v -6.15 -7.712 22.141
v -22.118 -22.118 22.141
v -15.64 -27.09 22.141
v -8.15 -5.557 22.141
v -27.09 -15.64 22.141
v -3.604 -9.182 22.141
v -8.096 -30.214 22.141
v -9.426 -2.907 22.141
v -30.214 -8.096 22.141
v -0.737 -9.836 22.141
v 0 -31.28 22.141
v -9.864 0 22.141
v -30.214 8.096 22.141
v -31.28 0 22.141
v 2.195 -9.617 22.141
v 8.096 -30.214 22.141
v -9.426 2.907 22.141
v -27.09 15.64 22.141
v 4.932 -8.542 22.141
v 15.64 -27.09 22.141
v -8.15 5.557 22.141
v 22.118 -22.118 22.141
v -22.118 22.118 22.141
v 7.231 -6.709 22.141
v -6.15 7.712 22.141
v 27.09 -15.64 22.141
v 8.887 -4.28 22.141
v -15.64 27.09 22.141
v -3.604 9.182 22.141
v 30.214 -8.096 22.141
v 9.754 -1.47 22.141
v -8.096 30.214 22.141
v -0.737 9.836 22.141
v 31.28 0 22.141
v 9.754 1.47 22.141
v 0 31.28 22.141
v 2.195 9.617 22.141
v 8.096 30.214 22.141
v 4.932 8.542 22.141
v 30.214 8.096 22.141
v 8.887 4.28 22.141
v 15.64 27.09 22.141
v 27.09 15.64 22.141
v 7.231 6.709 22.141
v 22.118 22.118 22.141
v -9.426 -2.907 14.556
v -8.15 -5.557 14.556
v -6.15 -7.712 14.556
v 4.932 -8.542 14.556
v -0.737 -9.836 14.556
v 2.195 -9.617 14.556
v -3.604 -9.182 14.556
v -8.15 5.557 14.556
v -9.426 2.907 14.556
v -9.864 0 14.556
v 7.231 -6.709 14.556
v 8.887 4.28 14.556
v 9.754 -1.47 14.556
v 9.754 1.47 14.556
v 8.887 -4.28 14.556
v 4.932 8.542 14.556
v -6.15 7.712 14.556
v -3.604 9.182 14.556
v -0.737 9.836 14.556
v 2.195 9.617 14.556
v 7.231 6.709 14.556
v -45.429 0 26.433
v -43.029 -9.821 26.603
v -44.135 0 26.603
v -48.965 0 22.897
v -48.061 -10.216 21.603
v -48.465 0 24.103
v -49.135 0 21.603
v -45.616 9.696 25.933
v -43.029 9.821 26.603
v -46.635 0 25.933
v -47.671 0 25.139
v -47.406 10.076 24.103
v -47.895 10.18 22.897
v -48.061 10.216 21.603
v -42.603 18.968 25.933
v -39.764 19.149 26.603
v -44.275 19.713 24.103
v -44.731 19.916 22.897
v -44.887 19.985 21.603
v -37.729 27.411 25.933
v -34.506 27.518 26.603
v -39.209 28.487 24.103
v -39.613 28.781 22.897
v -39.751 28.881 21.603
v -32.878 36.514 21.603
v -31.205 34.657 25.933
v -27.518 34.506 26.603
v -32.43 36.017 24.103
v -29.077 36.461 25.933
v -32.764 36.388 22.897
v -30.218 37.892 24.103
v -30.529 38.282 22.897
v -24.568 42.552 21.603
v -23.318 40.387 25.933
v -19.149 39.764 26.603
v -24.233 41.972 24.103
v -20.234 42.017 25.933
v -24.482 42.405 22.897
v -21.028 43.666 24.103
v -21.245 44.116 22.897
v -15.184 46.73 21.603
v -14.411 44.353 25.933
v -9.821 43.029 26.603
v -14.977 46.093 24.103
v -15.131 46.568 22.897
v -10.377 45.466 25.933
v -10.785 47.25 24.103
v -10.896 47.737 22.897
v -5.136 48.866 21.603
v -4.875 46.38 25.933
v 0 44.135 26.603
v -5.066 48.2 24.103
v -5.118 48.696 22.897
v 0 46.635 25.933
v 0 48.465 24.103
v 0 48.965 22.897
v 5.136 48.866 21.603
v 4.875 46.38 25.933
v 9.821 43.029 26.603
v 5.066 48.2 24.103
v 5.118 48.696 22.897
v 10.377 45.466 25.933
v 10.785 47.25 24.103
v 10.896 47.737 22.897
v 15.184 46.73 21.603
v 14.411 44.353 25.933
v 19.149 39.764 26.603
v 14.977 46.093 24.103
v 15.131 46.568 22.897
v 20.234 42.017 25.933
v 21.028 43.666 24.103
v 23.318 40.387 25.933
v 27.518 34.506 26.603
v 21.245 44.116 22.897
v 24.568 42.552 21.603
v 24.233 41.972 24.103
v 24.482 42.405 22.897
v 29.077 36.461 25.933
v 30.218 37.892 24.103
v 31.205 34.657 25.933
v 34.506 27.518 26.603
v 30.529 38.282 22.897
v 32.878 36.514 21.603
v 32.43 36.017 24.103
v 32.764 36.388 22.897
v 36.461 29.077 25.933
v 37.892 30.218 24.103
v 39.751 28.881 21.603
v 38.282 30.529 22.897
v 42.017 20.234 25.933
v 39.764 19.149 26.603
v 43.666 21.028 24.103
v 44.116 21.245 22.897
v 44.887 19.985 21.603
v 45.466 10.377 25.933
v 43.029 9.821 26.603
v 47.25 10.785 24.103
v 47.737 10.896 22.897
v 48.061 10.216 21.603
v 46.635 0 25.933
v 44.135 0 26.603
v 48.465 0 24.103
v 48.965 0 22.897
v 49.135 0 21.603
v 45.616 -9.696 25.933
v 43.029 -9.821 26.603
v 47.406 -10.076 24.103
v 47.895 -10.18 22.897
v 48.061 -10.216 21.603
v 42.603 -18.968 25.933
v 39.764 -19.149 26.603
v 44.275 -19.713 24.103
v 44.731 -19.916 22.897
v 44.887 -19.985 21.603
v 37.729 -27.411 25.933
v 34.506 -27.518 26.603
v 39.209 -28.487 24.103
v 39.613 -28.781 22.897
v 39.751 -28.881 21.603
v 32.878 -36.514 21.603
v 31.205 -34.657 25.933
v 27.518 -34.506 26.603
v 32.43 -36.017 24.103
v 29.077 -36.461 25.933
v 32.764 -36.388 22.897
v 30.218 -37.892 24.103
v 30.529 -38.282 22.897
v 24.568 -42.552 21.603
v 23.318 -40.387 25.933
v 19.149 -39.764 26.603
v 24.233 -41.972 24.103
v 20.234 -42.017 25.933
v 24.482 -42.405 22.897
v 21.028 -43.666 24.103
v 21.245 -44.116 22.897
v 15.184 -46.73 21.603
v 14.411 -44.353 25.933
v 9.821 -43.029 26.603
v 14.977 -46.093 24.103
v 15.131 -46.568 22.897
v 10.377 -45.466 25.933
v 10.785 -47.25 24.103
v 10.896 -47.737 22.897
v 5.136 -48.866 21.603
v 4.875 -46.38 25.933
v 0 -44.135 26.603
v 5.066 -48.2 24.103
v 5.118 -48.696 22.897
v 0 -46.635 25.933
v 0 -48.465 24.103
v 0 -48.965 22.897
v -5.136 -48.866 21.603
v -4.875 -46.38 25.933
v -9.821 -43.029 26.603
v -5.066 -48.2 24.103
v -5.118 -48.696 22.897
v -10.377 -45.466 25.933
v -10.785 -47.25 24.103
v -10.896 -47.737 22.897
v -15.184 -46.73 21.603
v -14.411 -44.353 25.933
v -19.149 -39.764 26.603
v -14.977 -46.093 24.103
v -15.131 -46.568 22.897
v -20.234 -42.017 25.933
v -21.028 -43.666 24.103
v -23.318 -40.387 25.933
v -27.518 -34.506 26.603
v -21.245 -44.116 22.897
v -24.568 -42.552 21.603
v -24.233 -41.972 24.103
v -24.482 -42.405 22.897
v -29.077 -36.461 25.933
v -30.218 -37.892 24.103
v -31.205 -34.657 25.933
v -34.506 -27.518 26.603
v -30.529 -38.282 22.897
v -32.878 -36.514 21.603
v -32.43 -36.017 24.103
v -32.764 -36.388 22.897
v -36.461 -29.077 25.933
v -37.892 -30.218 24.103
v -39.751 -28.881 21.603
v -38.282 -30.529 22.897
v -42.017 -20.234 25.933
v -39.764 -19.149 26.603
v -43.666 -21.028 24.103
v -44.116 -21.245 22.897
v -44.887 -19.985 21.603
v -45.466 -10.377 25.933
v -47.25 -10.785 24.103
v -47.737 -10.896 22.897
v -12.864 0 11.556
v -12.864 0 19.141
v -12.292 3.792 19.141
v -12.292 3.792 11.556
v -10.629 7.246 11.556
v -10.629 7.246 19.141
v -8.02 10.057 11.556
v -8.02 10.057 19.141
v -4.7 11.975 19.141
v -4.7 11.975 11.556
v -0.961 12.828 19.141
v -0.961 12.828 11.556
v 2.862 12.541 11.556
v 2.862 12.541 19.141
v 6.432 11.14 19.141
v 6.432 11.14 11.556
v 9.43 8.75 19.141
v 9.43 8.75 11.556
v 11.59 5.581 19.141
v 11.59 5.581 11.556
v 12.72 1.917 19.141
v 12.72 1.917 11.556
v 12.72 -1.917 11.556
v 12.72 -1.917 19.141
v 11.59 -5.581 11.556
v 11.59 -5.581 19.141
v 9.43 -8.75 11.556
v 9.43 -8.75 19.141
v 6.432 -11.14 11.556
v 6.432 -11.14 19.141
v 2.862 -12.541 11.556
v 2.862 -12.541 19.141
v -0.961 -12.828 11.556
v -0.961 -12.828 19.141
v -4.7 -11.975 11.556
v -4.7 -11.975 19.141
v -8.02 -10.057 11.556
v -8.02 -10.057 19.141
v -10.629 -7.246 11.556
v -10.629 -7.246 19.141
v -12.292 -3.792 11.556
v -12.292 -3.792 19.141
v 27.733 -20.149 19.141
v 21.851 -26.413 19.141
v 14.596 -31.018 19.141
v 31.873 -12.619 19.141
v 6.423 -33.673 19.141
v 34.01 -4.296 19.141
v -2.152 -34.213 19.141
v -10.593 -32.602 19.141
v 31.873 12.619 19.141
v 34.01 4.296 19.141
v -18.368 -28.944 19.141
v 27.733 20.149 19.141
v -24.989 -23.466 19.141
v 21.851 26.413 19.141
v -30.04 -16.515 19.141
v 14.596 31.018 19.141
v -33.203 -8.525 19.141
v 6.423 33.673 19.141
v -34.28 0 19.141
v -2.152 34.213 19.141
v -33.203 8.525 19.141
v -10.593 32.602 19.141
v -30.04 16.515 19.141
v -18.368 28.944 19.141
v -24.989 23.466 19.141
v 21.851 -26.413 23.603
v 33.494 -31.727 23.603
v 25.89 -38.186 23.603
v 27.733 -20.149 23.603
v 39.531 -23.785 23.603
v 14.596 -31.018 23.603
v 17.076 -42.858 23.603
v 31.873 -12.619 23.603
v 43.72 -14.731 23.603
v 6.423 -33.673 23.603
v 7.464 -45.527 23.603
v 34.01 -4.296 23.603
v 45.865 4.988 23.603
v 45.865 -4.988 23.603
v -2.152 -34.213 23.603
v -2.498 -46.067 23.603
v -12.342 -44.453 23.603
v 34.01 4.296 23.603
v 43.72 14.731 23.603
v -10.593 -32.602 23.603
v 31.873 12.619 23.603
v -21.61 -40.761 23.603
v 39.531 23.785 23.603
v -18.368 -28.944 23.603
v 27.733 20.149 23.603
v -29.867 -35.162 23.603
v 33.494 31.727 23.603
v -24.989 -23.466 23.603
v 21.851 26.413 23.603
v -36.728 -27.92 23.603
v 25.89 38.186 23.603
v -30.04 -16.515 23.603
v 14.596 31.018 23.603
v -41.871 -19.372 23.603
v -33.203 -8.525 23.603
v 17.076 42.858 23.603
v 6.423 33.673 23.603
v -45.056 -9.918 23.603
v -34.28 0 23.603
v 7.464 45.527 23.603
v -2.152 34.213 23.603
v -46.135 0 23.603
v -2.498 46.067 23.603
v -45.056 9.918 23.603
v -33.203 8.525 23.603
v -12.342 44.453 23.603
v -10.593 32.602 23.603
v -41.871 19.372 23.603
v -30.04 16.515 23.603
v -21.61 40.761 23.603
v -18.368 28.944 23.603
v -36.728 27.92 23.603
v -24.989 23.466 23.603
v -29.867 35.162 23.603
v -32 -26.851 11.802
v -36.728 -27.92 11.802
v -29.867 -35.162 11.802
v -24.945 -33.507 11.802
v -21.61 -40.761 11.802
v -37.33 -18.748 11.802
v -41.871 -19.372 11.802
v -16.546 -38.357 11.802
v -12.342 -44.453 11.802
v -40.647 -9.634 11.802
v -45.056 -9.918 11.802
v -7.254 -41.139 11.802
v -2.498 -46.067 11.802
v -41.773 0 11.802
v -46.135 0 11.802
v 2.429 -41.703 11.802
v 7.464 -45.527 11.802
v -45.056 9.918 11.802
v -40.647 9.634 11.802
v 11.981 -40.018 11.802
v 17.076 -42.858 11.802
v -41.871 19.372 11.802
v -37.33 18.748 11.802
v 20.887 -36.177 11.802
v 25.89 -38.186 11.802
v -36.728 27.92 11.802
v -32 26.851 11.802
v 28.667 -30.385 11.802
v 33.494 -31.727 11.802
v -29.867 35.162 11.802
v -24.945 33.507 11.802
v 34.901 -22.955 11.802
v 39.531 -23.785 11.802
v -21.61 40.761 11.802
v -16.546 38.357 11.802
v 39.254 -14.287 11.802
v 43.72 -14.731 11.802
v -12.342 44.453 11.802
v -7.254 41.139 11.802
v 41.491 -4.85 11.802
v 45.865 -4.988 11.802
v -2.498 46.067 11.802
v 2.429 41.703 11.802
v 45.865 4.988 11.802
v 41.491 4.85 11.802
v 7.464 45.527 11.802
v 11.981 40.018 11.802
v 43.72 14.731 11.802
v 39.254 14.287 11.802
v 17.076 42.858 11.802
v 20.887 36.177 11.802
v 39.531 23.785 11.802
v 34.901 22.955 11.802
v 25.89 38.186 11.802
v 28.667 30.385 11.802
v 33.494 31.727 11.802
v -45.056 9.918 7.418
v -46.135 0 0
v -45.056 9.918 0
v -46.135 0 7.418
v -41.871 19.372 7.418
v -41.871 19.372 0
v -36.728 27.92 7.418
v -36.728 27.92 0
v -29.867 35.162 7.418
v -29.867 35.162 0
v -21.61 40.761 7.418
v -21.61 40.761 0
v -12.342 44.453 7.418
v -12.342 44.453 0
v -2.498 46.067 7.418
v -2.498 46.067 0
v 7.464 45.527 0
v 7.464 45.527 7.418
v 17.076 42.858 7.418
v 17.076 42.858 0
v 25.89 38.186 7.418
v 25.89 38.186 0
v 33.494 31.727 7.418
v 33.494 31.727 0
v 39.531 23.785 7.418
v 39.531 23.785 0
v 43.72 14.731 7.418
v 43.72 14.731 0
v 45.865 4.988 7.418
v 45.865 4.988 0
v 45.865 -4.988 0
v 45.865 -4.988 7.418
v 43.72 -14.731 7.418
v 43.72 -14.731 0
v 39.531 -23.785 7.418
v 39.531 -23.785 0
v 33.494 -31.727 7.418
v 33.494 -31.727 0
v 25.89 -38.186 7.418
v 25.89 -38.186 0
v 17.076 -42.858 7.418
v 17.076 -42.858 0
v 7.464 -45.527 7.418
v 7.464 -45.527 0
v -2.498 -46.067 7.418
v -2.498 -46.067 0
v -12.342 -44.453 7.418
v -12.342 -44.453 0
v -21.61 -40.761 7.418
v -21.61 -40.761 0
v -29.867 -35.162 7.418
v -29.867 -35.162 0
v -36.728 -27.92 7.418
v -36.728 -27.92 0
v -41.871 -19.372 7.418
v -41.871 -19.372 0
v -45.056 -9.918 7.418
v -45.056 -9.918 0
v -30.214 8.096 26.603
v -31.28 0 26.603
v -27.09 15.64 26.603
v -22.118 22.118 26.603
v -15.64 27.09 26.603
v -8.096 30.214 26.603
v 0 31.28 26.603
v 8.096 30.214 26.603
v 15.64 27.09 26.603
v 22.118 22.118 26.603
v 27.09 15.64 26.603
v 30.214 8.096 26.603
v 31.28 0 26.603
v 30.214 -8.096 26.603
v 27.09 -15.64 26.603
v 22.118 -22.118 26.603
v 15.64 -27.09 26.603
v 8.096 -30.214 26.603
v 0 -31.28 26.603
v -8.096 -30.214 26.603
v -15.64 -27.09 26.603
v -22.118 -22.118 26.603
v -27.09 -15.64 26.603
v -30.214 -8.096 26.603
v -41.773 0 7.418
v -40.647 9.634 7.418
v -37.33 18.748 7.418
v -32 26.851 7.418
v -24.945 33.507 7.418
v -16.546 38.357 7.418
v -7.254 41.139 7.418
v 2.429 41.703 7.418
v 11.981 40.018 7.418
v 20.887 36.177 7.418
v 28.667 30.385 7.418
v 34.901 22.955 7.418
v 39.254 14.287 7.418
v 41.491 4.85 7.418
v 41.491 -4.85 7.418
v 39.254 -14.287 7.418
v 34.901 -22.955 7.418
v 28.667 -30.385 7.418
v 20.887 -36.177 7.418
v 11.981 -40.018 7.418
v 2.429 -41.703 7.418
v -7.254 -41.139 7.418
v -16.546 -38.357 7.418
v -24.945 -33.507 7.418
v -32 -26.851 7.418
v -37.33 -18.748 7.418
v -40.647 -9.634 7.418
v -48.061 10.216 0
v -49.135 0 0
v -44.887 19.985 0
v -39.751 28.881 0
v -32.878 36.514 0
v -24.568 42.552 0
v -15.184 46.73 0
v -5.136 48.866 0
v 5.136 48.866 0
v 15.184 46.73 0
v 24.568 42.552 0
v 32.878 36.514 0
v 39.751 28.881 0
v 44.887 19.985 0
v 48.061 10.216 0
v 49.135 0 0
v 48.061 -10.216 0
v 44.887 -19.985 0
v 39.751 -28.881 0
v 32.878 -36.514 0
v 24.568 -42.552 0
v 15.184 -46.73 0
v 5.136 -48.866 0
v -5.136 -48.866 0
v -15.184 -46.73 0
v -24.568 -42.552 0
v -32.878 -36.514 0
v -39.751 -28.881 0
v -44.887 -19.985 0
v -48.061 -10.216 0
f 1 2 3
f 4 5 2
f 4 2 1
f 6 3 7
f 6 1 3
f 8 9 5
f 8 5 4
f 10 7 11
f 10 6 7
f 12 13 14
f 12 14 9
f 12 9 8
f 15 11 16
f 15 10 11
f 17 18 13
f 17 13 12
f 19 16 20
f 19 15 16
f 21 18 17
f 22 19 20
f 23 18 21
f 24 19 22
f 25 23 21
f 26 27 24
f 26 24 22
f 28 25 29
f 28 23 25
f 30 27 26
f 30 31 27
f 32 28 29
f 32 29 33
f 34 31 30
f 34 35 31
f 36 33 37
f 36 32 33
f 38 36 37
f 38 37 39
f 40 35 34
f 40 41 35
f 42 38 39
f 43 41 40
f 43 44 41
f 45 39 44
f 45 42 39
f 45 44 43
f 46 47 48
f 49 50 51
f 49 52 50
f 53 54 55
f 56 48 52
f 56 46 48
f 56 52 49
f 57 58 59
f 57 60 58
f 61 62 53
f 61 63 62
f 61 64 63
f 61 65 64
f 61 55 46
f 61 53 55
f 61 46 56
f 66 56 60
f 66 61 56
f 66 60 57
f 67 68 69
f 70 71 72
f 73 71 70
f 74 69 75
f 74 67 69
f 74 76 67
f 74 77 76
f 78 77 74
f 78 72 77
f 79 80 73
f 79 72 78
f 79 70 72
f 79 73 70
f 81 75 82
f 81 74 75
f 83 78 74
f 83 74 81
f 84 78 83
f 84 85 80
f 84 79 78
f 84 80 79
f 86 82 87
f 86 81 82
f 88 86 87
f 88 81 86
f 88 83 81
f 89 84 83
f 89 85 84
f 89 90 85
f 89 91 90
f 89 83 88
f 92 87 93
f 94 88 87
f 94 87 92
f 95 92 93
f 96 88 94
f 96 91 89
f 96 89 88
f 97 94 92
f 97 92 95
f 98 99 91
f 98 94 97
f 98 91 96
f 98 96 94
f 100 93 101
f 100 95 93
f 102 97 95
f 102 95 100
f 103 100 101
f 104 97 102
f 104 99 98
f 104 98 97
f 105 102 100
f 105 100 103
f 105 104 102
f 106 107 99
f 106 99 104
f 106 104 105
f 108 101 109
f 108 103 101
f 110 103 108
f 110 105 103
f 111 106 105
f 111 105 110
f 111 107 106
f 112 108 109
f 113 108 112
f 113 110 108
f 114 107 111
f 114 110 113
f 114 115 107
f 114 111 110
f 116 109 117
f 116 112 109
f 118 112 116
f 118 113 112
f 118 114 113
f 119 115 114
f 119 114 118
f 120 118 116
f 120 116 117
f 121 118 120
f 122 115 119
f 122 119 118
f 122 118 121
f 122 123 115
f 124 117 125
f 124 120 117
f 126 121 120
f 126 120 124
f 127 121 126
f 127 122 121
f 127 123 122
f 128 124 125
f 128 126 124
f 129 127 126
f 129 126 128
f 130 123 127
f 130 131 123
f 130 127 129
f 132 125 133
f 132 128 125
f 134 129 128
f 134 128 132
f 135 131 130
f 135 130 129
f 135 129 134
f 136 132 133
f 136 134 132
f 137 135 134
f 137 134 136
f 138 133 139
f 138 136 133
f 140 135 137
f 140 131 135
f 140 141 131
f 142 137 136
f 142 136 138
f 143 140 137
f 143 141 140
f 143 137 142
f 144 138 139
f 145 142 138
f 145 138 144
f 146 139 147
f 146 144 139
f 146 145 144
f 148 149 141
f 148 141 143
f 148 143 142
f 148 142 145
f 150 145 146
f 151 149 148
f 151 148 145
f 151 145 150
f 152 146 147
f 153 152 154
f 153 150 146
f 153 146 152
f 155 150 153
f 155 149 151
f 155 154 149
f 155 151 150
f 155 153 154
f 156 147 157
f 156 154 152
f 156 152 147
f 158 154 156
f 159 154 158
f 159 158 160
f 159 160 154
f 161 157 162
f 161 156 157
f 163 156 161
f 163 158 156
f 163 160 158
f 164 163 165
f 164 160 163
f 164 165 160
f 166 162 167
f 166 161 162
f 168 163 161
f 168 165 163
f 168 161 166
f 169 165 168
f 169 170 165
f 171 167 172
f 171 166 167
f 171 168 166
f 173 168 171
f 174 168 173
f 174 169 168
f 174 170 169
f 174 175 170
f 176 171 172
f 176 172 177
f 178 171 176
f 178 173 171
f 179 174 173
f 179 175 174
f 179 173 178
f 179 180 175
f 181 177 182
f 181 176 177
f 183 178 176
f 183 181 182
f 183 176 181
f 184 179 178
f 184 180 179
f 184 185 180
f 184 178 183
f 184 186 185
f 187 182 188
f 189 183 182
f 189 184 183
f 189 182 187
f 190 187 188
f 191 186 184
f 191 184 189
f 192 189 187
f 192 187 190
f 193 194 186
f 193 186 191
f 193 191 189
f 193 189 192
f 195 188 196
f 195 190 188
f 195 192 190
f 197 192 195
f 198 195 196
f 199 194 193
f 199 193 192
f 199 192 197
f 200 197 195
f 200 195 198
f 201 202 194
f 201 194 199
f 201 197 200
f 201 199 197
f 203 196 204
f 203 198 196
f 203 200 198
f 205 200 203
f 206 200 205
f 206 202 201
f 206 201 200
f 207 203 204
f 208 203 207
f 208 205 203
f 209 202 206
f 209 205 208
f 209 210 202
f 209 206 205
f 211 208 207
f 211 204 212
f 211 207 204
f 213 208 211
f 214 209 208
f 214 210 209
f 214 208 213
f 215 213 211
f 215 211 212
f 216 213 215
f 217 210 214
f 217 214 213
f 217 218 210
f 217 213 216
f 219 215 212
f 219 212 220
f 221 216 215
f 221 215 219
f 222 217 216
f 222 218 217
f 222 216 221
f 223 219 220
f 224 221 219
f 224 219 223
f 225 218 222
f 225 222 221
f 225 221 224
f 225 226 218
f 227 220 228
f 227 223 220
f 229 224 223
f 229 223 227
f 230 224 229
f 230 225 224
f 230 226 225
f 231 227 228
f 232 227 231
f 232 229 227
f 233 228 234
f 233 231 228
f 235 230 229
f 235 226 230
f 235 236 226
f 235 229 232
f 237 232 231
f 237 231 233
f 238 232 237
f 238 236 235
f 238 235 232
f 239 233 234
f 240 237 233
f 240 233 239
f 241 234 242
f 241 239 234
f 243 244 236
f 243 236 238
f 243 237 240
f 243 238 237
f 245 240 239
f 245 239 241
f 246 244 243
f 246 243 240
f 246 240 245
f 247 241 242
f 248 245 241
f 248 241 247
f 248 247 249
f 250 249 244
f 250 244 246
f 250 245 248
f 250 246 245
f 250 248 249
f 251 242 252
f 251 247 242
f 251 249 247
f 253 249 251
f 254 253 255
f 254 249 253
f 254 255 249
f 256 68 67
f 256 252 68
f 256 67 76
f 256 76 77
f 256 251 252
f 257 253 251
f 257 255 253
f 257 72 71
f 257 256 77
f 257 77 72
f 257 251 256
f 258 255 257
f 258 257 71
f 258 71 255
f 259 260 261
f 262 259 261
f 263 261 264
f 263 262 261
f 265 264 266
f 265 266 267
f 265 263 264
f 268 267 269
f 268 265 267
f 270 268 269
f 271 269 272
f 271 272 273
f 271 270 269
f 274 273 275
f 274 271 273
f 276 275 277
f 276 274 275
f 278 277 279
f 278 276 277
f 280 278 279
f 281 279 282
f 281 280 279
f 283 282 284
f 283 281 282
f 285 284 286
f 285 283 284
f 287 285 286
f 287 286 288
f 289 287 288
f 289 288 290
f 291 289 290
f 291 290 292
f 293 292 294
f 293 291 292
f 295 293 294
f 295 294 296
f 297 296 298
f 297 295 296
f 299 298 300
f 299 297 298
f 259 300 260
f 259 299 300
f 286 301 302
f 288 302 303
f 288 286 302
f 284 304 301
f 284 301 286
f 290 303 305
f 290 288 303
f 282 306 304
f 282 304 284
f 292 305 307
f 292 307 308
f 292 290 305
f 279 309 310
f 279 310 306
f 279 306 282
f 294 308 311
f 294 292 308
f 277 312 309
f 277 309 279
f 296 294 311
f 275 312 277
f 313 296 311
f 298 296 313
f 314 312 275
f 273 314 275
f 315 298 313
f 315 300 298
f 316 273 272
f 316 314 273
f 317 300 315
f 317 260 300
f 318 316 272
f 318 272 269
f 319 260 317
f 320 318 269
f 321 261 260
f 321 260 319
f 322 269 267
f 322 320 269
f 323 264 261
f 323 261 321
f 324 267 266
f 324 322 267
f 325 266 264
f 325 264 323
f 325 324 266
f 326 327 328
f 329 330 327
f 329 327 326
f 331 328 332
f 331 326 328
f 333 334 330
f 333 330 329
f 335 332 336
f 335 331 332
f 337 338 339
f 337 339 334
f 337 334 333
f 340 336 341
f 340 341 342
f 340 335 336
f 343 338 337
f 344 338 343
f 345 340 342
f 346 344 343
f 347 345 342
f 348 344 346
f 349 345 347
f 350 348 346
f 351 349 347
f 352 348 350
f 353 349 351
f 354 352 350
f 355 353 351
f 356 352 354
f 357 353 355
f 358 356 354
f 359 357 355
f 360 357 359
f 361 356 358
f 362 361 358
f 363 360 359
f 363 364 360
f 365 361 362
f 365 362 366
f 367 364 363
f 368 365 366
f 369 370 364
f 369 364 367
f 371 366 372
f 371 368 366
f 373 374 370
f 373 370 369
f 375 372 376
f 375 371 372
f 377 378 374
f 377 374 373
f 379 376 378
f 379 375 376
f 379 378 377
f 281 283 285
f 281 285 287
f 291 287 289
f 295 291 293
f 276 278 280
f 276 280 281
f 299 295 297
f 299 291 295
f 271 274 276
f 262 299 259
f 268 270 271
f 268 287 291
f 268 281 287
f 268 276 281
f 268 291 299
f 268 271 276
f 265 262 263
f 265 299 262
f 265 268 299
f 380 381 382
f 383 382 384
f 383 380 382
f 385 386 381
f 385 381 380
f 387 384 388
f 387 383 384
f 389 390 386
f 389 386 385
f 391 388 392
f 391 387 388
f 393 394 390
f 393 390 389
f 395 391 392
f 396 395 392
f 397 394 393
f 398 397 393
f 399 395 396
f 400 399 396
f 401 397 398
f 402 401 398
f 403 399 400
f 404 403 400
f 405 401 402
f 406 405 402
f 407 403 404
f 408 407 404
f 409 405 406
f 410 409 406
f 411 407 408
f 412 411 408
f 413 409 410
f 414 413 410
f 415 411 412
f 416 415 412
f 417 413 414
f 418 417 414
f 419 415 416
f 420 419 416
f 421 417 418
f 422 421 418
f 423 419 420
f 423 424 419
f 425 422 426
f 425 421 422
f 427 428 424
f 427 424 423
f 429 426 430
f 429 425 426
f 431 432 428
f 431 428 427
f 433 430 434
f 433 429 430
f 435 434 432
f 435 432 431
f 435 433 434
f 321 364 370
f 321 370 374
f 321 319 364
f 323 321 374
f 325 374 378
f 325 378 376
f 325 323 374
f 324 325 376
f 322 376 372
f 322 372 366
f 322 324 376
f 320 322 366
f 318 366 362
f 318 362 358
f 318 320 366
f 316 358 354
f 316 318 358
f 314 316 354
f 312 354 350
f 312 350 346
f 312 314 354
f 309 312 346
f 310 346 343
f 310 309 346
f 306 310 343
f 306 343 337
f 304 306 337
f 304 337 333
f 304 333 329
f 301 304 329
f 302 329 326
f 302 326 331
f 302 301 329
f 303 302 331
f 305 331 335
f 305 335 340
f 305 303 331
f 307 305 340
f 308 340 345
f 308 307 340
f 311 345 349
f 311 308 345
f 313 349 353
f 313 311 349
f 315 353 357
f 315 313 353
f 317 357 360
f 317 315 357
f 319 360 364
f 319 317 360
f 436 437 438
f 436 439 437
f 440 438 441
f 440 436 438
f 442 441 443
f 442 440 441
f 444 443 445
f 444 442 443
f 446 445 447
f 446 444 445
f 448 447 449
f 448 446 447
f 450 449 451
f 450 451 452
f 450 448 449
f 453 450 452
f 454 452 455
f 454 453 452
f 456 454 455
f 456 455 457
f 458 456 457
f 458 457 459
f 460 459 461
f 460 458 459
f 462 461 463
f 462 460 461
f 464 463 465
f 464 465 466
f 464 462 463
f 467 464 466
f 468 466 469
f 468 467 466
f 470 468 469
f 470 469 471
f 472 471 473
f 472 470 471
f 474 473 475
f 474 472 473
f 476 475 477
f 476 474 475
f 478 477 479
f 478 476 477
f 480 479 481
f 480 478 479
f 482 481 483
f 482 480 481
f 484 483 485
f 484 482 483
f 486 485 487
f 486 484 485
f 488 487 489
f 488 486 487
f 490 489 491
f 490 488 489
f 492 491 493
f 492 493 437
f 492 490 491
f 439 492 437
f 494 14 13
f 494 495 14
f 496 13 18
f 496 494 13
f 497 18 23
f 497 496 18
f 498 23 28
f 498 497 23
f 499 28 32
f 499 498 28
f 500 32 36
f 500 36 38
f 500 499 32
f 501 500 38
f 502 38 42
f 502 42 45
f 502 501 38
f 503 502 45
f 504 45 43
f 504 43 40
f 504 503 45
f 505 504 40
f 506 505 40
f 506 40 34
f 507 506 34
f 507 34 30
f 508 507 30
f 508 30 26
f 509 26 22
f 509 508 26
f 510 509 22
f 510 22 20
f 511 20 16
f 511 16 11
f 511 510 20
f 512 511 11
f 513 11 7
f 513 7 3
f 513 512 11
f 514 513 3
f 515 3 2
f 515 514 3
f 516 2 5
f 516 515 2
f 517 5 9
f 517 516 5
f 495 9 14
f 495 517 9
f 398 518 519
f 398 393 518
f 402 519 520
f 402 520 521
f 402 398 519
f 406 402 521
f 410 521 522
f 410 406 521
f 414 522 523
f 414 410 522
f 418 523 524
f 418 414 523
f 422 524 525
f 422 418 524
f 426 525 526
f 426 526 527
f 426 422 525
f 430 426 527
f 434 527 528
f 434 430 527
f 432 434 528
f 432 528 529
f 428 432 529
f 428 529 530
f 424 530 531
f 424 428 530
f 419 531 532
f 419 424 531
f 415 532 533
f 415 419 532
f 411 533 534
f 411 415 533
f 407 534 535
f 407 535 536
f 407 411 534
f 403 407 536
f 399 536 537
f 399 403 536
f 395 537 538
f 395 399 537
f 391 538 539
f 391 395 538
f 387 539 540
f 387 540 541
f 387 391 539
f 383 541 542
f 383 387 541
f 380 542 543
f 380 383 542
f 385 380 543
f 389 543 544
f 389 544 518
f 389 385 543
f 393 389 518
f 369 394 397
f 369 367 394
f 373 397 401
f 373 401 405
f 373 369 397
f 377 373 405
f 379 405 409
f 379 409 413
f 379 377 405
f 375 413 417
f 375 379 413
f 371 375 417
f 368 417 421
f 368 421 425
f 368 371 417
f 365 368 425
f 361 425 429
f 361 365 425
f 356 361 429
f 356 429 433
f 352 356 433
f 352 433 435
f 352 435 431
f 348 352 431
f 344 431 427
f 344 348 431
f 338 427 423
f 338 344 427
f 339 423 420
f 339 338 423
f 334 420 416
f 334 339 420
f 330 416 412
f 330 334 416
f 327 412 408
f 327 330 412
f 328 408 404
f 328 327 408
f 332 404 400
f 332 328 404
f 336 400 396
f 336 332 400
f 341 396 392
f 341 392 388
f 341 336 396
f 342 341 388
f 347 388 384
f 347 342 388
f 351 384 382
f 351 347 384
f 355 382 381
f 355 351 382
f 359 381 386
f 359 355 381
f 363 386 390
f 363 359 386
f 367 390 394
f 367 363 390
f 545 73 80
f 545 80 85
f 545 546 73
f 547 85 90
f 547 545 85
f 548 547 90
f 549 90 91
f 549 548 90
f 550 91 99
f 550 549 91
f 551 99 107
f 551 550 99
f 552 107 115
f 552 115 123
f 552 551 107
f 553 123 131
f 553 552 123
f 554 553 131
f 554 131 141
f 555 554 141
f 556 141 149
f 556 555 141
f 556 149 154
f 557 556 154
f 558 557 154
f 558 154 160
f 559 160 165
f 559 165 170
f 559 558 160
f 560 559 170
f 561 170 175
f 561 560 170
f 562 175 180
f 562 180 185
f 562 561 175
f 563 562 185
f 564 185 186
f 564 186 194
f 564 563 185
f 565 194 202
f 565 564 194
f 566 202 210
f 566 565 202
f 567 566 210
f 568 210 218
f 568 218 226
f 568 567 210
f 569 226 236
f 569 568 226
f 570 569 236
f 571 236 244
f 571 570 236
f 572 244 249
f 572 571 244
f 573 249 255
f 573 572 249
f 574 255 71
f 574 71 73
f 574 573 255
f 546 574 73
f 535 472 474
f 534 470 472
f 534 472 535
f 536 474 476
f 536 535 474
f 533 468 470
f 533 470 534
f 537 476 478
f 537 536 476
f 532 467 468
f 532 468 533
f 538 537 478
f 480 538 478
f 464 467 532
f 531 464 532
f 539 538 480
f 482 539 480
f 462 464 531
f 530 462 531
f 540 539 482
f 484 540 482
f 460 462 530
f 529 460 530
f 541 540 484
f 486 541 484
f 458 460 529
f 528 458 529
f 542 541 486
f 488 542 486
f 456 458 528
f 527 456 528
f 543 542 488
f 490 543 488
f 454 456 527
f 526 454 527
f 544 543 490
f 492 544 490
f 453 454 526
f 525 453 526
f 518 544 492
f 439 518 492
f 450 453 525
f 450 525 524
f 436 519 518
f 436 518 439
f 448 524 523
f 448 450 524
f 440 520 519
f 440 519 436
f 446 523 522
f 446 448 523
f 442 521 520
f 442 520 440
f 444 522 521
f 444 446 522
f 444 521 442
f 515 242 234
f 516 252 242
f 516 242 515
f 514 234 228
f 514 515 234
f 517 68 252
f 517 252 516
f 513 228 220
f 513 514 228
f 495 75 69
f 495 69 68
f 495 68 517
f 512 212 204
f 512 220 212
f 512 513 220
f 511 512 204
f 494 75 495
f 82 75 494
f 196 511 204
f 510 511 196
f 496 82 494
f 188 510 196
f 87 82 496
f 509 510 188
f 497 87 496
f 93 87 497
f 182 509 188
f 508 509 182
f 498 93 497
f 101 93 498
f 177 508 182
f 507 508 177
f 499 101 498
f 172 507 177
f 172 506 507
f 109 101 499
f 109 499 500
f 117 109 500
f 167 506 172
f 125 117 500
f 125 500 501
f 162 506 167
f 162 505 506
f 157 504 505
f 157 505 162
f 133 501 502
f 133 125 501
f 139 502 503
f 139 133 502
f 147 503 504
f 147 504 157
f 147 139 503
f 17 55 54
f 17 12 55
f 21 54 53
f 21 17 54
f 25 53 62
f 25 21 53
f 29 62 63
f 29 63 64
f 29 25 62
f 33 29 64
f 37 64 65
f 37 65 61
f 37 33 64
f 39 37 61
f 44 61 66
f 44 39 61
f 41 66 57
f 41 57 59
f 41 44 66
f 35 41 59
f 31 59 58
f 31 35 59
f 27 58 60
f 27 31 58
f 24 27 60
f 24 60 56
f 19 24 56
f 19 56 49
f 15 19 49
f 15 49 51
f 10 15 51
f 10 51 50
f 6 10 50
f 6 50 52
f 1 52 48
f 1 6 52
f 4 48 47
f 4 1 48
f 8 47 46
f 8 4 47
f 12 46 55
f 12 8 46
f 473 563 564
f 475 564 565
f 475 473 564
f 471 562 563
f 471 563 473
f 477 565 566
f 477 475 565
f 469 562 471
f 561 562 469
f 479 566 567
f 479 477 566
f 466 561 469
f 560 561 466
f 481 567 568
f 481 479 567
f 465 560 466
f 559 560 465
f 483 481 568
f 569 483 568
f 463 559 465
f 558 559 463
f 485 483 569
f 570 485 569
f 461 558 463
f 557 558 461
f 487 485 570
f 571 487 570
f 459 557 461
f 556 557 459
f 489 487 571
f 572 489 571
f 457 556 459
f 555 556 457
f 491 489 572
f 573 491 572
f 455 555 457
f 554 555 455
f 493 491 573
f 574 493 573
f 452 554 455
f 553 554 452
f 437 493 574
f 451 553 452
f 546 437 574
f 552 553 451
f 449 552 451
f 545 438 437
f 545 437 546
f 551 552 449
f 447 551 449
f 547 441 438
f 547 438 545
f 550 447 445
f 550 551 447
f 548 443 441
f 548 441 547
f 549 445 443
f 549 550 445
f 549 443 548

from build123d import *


with BuildPart() as f1:
    # F0 (on Front) → F1 (revolve)
    with BuildSketch(Plane.XZ):
        with BuildLine():
            Line((-49.135093, 21.603222), (-49.135093, 0))
            Line((-49.135093, 0), (-46.135093, 0))
            Line((-46.135093, 0), (-46.135093, 7.41767))
            Line((-46.135093, 7.41767), (-41.773196, 7.41767))
            Line((-41.773196, 7.41767), (-41.773196, 11.801611))
            Line((-41.773196, 11.801611), (-46.135093, 11.801611))
            Line((-46.135093, 11.801611), (-46.135093, 23.603222))
            Line((-46.135093, 23.603222), (-34.280277, 23.603222))
            Line((-34.280277, 23.603222), (-34.280277, 19.141468))
            Line((-34.280277, 19.141468), (-12.863847, 19.141468))
            Line((-12.863847, 19.141468), (-12.863847, 11.556481))
            Line((-12.863847, 11.556481), (0, 11.556481))
            Line((0, 11.556481), (0, 14.556481))
            Line((0, 14.556481), (-9.863847, 14.556481))
            Line((-9.863847, 14.556481), (-9.863847, 22.141468))
            Line((-9.863847, 22.141468), (-31.280277, 22.141468))
            Line((-31.280277, 22.141468), (-31.280277, 26.603222))
            Line((-31.280277, 26.603222), (-44.135093, 26.603222))
            ThreePointArc((-44.135093, 26.603222), (-47.670627, 25.138756), (-49.135093, 21.603222))
        make_face()
    revolve(axis=Axis((0, 0, 13.056481), (0, 0, -1)))


solid = f1.part
